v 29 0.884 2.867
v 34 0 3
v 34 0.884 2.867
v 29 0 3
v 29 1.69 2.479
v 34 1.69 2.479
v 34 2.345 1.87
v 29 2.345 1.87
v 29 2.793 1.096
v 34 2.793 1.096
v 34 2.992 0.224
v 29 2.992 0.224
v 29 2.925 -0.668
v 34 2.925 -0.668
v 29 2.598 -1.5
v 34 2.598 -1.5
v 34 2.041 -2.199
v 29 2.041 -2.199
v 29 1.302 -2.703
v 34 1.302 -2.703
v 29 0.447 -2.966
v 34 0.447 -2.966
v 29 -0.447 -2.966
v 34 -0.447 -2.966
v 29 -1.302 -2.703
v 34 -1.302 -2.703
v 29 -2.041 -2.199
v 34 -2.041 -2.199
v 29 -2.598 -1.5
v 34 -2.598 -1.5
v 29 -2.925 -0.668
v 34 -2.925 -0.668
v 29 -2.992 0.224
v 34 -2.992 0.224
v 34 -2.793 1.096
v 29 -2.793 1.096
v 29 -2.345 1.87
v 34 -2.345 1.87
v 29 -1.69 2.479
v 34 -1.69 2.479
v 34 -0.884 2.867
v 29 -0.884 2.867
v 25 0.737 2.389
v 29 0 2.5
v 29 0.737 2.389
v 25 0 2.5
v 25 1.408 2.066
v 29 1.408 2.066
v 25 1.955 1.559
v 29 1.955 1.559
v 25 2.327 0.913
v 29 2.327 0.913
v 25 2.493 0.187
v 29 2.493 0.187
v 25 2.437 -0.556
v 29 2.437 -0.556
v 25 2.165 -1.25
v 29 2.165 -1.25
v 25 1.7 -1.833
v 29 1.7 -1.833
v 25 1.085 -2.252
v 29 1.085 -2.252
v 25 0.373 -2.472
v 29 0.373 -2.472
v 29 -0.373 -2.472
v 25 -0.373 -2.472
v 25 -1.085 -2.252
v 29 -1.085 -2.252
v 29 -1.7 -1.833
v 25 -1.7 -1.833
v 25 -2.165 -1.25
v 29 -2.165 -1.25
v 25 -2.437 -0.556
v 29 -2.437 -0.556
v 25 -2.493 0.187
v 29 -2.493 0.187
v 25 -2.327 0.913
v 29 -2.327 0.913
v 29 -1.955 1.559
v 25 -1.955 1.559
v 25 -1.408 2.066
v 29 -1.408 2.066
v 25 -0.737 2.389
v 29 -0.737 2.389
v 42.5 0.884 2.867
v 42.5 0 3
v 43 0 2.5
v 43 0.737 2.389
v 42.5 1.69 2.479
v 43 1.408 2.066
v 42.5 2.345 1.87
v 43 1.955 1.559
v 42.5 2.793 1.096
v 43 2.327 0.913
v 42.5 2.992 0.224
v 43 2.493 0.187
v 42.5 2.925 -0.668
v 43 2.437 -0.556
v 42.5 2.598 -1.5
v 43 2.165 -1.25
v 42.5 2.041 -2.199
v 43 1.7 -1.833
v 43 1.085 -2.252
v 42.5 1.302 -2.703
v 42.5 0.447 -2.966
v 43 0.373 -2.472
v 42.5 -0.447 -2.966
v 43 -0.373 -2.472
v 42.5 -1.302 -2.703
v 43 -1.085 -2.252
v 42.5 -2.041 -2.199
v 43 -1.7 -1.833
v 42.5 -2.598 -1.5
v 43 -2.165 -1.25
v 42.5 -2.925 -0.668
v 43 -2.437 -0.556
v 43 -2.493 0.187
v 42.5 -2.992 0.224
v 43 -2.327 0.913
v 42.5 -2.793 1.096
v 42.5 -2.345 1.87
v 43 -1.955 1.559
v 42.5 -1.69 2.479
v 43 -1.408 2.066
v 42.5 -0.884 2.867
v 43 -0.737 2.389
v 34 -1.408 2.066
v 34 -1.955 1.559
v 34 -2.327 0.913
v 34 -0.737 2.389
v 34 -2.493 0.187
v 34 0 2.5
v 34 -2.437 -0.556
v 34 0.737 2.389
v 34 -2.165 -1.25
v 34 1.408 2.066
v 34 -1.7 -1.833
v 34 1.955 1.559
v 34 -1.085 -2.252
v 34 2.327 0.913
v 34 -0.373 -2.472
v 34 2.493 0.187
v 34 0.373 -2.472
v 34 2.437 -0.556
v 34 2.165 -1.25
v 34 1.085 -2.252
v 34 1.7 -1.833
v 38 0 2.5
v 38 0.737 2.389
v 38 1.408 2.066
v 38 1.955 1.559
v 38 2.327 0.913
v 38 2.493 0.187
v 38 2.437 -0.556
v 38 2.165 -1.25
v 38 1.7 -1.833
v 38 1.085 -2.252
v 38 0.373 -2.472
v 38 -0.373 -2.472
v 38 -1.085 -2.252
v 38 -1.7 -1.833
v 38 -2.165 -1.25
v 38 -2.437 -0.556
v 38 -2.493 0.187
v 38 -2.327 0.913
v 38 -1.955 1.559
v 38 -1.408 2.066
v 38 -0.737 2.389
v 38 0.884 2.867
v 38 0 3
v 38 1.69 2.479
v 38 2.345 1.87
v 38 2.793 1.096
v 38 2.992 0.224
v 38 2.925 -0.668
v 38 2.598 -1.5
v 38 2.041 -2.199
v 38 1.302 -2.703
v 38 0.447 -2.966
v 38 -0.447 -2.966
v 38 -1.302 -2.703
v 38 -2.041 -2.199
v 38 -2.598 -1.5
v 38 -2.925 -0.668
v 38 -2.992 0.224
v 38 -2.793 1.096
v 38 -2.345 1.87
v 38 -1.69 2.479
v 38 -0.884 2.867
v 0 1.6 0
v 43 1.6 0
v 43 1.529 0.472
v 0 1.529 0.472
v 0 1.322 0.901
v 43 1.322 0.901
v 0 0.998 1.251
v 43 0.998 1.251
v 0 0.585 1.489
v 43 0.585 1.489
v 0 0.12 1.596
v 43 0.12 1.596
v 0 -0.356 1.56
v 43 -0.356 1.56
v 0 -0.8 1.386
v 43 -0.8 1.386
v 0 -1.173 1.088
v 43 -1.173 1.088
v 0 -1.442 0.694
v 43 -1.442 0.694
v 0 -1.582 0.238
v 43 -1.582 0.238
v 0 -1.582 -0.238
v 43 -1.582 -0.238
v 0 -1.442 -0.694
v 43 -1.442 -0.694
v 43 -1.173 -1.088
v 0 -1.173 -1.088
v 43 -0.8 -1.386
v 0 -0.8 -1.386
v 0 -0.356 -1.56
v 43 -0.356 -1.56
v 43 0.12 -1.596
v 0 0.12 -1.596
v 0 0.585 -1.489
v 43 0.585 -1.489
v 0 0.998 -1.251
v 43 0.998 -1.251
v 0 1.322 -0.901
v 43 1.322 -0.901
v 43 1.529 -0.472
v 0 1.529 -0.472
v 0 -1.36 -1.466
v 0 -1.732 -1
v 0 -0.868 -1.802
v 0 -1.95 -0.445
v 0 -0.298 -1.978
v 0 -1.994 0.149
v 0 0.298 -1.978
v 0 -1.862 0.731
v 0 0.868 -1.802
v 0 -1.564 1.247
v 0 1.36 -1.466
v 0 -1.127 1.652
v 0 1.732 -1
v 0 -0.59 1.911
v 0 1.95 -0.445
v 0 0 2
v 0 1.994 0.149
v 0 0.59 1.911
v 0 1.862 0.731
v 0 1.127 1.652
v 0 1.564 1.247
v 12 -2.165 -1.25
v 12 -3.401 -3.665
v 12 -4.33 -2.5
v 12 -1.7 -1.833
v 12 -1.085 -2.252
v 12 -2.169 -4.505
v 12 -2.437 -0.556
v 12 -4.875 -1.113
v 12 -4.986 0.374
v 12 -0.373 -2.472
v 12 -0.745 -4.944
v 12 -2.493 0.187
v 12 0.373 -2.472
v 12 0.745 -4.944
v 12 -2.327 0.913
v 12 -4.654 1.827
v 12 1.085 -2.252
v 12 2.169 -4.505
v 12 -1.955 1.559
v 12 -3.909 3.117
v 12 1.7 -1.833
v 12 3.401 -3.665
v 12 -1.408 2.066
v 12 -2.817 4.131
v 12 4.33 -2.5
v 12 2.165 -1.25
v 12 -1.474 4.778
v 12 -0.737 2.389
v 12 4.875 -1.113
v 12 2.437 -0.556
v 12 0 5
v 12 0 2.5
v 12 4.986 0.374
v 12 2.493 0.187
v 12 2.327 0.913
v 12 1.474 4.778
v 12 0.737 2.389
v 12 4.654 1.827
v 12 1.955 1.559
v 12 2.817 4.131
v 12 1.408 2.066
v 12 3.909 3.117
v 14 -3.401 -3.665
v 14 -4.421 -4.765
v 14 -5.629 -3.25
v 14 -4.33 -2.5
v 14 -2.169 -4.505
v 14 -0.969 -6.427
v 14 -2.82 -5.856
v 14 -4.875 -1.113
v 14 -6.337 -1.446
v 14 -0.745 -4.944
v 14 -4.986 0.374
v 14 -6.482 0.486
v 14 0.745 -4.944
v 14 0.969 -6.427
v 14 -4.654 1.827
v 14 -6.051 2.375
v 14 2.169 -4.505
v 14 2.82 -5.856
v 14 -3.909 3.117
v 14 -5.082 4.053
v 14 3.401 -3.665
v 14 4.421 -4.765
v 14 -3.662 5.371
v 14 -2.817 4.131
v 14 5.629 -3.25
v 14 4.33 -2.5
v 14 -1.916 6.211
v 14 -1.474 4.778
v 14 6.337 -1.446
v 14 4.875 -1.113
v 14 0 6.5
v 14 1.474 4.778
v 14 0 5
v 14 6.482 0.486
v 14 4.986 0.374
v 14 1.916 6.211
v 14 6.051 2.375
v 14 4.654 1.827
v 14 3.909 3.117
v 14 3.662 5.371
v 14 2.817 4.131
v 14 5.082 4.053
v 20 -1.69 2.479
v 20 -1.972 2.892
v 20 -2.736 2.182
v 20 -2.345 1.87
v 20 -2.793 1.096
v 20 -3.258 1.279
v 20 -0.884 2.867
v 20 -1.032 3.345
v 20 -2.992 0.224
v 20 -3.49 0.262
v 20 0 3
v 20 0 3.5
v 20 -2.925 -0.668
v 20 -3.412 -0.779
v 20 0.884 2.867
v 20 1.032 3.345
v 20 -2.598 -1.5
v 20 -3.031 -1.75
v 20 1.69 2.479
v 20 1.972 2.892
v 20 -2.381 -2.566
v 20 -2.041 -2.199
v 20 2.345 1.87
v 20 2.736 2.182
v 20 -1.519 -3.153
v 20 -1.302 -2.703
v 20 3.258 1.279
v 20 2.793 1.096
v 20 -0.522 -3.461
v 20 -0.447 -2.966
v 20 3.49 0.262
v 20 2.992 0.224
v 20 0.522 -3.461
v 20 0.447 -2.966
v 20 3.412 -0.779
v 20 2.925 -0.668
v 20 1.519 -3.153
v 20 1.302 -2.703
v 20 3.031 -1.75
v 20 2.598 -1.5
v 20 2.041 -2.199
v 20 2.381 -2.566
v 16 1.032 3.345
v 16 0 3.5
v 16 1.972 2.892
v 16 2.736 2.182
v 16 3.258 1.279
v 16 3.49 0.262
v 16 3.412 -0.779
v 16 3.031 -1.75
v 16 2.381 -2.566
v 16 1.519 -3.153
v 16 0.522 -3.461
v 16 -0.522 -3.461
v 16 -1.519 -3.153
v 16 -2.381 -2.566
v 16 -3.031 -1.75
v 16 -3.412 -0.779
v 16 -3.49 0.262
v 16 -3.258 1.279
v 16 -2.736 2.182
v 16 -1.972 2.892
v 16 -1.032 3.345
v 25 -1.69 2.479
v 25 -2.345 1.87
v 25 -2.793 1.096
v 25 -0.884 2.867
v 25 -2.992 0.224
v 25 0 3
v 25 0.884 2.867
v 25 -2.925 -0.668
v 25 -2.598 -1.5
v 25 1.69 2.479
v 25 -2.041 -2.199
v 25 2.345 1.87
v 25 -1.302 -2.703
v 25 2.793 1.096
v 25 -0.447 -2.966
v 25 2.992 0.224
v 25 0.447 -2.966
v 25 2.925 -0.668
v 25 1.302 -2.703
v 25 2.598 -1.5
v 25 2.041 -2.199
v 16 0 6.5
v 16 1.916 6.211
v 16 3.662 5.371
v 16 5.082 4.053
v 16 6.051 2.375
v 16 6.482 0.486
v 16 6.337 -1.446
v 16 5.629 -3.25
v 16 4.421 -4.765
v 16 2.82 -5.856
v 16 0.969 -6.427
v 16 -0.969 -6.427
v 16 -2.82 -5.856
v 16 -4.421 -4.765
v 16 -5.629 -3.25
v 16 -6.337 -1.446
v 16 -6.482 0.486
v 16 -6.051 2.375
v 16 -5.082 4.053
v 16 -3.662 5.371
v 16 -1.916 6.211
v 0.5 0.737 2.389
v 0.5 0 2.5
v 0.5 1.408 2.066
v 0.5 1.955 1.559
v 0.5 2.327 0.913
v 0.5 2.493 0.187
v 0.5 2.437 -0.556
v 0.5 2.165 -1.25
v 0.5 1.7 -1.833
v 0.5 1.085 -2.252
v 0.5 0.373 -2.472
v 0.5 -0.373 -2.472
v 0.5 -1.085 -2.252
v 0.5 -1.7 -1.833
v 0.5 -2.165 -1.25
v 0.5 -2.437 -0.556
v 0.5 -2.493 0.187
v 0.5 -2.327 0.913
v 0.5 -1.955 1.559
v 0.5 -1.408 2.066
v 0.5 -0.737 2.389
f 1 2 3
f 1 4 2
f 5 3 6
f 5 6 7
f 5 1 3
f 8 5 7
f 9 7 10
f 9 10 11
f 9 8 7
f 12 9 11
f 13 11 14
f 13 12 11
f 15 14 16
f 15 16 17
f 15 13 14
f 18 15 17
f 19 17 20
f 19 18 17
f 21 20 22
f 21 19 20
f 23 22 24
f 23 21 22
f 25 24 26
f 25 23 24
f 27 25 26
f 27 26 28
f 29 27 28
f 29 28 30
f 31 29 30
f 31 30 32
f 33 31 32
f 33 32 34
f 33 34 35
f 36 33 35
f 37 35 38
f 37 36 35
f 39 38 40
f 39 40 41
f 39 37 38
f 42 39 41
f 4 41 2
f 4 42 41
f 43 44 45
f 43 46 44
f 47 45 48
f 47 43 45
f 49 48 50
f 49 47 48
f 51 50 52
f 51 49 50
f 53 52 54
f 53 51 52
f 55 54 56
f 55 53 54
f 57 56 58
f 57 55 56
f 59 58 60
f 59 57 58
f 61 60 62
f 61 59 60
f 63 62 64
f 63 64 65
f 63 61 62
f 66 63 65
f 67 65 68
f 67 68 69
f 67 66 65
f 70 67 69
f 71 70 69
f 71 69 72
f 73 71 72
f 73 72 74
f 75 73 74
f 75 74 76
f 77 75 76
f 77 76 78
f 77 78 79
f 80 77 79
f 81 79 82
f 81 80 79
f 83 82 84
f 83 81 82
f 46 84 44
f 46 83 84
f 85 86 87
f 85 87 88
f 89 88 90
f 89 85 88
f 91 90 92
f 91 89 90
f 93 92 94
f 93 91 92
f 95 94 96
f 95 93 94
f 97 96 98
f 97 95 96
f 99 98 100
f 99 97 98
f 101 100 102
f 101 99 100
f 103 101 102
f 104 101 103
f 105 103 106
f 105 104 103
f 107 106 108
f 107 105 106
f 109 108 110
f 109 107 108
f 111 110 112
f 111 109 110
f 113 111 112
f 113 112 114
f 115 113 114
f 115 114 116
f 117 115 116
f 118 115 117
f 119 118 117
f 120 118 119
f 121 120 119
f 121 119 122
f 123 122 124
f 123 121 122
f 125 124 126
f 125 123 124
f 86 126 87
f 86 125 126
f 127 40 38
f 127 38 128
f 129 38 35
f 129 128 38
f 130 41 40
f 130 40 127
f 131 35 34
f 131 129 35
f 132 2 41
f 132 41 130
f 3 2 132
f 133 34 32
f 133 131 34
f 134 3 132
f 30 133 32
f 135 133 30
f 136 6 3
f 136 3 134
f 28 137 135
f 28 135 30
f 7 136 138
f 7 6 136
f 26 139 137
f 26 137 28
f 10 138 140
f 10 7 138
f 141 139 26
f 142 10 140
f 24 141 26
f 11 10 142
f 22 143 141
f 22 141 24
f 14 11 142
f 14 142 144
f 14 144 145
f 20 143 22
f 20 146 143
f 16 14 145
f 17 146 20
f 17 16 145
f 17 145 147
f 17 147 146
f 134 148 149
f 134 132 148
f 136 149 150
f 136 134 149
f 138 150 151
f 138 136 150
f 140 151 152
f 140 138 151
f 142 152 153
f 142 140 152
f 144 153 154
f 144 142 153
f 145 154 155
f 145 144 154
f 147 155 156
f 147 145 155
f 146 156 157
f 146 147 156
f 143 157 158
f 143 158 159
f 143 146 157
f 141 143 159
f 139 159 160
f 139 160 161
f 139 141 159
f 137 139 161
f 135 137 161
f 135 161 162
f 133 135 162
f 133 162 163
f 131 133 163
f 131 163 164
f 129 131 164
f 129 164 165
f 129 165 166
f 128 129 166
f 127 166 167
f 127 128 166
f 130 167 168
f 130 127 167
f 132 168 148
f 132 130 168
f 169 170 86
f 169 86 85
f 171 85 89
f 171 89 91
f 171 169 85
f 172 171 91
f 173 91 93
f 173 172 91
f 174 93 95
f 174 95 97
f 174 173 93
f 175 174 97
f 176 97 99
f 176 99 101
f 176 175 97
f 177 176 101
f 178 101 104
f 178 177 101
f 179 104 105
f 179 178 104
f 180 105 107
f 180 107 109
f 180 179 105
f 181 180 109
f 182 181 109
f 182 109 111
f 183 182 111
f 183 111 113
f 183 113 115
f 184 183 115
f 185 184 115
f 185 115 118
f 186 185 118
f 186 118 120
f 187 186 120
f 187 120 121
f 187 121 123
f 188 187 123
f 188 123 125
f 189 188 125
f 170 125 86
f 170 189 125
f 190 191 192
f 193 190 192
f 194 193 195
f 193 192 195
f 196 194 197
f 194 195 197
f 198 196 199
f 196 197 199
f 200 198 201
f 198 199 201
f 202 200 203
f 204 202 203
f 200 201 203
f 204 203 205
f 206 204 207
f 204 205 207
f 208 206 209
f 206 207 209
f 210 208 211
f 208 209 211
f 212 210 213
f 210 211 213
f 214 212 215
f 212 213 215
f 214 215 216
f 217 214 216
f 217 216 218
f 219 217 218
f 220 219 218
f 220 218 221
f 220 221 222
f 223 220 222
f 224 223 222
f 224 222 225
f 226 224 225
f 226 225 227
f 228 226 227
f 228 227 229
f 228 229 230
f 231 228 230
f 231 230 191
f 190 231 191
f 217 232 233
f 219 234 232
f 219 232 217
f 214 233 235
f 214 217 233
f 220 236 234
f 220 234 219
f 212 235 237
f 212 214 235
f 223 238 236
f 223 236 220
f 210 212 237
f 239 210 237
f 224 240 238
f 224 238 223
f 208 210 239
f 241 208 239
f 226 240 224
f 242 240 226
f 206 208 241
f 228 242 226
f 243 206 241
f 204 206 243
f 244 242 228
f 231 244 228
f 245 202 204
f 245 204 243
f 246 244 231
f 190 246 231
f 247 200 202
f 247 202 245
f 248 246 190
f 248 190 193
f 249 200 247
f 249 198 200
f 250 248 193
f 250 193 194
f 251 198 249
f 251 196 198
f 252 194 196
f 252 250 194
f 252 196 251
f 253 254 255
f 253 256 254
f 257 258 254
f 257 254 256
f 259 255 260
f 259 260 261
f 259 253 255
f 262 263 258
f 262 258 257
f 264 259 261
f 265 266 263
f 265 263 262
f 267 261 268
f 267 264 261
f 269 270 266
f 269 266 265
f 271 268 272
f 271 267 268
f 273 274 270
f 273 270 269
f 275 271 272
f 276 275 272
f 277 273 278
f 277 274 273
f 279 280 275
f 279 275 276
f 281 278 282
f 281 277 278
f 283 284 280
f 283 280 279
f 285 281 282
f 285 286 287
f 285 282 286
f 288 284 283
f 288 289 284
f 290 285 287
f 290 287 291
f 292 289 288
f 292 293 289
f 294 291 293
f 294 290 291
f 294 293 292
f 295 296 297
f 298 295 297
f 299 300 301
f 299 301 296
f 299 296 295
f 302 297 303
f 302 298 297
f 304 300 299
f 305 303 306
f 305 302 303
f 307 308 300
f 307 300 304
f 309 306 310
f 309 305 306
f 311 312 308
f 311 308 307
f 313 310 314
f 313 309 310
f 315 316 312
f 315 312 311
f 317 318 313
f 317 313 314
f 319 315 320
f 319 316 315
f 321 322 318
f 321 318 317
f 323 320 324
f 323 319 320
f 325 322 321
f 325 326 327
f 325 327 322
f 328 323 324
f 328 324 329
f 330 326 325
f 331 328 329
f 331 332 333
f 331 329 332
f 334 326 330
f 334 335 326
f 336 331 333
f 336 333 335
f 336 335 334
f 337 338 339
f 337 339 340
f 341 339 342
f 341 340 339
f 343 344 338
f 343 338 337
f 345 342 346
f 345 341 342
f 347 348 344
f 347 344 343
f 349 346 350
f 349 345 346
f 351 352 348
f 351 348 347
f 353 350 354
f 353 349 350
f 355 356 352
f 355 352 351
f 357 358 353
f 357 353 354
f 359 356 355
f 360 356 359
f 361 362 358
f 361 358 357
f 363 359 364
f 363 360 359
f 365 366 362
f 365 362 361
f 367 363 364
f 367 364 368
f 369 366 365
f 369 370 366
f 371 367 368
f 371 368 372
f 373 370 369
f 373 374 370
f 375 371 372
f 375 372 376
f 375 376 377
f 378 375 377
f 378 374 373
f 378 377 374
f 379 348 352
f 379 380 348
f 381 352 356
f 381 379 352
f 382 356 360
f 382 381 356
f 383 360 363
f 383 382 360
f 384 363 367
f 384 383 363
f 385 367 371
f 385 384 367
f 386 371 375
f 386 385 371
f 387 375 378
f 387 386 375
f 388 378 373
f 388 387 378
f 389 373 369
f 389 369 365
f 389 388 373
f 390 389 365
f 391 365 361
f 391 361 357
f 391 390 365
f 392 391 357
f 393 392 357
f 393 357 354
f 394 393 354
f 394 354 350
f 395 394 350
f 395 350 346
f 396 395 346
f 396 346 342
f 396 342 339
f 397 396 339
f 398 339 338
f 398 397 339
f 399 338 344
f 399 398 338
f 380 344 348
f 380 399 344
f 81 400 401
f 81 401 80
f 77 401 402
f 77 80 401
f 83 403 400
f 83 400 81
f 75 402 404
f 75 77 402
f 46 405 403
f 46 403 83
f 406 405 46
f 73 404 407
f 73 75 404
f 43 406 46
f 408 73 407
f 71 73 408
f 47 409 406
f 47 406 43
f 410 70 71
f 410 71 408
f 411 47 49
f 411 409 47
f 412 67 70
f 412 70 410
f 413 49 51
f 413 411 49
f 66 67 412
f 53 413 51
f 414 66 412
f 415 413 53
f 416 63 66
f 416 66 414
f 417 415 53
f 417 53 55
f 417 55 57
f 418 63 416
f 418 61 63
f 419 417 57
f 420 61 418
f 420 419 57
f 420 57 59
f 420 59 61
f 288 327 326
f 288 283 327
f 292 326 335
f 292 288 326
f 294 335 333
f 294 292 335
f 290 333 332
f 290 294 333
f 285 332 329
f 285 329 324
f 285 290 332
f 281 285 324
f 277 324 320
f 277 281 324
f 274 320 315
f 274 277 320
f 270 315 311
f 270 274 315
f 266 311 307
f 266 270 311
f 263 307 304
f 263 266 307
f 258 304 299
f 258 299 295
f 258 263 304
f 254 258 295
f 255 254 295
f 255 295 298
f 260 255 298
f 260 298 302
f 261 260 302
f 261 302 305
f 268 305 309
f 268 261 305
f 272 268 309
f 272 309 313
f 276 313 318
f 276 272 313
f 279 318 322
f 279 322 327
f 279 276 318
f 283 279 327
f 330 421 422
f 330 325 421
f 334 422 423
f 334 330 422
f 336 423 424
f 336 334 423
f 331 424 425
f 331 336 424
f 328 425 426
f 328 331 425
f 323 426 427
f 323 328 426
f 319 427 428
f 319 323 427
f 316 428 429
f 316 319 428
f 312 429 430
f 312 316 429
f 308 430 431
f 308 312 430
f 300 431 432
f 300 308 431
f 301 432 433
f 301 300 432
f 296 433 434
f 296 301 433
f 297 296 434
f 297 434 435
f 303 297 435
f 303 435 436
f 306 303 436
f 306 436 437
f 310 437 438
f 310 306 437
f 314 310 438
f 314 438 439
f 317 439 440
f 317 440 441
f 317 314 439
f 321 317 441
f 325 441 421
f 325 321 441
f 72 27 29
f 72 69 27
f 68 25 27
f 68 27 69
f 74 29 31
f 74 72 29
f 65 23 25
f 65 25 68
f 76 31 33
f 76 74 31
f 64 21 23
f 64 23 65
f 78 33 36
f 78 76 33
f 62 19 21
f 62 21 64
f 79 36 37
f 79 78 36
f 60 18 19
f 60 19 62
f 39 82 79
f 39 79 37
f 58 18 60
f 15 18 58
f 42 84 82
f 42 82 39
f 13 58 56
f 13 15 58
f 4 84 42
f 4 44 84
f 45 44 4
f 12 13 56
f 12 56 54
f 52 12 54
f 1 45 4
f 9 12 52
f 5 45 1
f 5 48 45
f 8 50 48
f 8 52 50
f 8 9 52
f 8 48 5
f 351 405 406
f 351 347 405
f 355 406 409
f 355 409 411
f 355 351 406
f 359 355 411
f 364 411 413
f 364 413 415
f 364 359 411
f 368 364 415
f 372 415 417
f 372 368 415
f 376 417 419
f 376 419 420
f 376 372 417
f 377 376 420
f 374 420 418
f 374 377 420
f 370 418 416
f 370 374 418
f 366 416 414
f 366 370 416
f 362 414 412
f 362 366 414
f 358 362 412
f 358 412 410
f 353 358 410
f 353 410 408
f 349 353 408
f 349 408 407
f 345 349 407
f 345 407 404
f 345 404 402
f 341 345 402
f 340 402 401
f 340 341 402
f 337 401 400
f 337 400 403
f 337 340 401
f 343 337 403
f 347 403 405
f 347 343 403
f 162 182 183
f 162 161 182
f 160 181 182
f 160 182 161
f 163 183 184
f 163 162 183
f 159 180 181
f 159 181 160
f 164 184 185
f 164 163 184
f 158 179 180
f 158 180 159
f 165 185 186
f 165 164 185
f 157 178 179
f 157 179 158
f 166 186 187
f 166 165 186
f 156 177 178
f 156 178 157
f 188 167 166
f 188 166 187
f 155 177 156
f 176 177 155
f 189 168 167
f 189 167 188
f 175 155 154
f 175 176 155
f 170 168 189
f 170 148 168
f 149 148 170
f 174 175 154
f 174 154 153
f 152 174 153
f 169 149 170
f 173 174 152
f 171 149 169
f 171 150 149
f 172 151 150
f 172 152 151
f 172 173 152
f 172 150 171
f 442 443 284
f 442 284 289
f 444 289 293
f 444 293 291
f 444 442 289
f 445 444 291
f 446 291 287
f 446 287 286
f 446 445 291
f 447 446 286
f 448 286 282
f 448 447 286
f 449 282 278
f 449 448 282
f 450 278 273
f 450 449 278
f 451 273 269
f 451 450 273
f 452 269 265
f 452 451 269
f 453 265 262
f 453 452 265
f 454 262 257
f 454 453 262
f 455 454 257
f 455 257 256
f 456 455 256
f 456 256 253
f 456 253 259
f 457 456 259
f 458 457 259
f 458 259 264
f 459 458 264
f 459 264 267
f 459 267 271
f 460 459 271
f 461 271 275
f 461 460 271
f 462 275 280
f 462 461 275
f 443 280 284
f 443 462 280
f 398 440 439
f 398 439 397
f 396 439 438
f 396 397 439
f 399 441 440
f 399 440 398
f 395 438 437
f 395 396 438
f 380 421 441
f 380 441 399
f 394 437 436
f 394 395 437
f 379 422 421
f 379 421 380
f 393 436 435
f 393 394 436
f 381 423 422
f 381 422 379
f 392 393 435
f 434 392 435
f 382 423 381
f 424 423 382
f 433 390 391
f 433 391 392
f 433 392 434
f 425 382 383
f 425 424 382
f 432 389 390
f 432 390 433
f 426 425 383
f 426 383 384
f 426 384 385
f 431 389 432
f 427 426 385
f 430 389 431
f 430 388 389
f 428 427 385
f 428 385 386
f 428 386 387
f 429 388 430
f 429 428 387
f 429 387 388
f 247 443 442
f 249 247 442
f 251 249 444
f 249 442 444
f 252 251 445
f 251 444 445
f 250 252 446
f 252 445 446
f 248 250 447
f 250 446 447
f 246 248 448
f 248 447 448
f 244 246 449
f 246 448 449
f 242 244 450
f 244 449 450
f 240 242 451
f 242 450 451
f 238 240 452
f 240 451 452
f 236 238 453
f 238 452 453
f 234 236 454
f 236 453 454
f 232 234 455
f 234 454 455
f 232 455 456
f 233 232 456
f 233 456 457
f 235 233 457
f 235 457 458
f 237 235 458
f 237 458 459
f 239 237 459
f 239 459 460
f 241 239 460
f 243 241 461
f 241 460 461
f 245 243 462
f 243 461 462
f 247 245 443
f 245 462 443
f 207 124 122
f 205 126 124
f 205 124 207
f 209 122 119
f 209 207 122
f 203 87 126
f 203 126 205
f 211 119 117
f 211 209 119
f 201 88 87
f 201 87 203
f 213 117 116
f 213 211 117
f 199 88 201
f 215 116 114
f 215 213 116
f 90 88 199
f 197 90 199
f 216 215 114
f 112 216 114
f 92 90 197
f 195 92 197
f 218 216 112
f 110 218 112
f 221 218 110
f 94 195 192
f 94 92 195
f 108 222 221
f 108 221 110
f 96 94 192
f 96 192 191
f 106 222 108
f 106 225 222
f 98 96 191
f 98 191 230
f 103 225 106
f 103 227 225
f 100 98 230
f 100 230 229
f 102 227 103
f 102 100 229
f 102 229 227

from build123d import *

# Parameters (mm, degrees)
F2_R     = 1.6
F3_DEPTH = 43.001
F4_SIZE  = 0.5


with BuildPart() as f1:
    # F0 (on Front) → F1 (revolve)
    with BuildSketch(Plane.XZ):
        Polygon((0, 2.5), (0, 0), (43, 0), (43, 3), (38, 3), (38, 2.5), (34, 2.5), (34, 3), (29, 3), (29, 2.5), (25, 2.5), (25, 3), (20, 3), (20, 3.5), (16, 3.5), (16, 6.5), (14, 6.5), (14, 5), (12, 5), (12, 2.5), align=None)
    revolve(axis=Axis((-2.710388, 0, 0), (-1, 0, 0)))

    # F2 (on face) → F3 (cut, through all)
    with BuildSketch(Plane.YZ.offset(43)):
        Circle(F2_R)
    extrude(amount=-F3_DEPTH, mode=Mode.SUBTRACT)

    # F4
    f4_edges = [f1.edges().sort_by_distance(p)[0] for p in [
        (43, 0, -3),
        (0, 0, -2.5),
    ]]
    chamfer(f4_edges, length=F4_SIZE)


solid = f1.part
